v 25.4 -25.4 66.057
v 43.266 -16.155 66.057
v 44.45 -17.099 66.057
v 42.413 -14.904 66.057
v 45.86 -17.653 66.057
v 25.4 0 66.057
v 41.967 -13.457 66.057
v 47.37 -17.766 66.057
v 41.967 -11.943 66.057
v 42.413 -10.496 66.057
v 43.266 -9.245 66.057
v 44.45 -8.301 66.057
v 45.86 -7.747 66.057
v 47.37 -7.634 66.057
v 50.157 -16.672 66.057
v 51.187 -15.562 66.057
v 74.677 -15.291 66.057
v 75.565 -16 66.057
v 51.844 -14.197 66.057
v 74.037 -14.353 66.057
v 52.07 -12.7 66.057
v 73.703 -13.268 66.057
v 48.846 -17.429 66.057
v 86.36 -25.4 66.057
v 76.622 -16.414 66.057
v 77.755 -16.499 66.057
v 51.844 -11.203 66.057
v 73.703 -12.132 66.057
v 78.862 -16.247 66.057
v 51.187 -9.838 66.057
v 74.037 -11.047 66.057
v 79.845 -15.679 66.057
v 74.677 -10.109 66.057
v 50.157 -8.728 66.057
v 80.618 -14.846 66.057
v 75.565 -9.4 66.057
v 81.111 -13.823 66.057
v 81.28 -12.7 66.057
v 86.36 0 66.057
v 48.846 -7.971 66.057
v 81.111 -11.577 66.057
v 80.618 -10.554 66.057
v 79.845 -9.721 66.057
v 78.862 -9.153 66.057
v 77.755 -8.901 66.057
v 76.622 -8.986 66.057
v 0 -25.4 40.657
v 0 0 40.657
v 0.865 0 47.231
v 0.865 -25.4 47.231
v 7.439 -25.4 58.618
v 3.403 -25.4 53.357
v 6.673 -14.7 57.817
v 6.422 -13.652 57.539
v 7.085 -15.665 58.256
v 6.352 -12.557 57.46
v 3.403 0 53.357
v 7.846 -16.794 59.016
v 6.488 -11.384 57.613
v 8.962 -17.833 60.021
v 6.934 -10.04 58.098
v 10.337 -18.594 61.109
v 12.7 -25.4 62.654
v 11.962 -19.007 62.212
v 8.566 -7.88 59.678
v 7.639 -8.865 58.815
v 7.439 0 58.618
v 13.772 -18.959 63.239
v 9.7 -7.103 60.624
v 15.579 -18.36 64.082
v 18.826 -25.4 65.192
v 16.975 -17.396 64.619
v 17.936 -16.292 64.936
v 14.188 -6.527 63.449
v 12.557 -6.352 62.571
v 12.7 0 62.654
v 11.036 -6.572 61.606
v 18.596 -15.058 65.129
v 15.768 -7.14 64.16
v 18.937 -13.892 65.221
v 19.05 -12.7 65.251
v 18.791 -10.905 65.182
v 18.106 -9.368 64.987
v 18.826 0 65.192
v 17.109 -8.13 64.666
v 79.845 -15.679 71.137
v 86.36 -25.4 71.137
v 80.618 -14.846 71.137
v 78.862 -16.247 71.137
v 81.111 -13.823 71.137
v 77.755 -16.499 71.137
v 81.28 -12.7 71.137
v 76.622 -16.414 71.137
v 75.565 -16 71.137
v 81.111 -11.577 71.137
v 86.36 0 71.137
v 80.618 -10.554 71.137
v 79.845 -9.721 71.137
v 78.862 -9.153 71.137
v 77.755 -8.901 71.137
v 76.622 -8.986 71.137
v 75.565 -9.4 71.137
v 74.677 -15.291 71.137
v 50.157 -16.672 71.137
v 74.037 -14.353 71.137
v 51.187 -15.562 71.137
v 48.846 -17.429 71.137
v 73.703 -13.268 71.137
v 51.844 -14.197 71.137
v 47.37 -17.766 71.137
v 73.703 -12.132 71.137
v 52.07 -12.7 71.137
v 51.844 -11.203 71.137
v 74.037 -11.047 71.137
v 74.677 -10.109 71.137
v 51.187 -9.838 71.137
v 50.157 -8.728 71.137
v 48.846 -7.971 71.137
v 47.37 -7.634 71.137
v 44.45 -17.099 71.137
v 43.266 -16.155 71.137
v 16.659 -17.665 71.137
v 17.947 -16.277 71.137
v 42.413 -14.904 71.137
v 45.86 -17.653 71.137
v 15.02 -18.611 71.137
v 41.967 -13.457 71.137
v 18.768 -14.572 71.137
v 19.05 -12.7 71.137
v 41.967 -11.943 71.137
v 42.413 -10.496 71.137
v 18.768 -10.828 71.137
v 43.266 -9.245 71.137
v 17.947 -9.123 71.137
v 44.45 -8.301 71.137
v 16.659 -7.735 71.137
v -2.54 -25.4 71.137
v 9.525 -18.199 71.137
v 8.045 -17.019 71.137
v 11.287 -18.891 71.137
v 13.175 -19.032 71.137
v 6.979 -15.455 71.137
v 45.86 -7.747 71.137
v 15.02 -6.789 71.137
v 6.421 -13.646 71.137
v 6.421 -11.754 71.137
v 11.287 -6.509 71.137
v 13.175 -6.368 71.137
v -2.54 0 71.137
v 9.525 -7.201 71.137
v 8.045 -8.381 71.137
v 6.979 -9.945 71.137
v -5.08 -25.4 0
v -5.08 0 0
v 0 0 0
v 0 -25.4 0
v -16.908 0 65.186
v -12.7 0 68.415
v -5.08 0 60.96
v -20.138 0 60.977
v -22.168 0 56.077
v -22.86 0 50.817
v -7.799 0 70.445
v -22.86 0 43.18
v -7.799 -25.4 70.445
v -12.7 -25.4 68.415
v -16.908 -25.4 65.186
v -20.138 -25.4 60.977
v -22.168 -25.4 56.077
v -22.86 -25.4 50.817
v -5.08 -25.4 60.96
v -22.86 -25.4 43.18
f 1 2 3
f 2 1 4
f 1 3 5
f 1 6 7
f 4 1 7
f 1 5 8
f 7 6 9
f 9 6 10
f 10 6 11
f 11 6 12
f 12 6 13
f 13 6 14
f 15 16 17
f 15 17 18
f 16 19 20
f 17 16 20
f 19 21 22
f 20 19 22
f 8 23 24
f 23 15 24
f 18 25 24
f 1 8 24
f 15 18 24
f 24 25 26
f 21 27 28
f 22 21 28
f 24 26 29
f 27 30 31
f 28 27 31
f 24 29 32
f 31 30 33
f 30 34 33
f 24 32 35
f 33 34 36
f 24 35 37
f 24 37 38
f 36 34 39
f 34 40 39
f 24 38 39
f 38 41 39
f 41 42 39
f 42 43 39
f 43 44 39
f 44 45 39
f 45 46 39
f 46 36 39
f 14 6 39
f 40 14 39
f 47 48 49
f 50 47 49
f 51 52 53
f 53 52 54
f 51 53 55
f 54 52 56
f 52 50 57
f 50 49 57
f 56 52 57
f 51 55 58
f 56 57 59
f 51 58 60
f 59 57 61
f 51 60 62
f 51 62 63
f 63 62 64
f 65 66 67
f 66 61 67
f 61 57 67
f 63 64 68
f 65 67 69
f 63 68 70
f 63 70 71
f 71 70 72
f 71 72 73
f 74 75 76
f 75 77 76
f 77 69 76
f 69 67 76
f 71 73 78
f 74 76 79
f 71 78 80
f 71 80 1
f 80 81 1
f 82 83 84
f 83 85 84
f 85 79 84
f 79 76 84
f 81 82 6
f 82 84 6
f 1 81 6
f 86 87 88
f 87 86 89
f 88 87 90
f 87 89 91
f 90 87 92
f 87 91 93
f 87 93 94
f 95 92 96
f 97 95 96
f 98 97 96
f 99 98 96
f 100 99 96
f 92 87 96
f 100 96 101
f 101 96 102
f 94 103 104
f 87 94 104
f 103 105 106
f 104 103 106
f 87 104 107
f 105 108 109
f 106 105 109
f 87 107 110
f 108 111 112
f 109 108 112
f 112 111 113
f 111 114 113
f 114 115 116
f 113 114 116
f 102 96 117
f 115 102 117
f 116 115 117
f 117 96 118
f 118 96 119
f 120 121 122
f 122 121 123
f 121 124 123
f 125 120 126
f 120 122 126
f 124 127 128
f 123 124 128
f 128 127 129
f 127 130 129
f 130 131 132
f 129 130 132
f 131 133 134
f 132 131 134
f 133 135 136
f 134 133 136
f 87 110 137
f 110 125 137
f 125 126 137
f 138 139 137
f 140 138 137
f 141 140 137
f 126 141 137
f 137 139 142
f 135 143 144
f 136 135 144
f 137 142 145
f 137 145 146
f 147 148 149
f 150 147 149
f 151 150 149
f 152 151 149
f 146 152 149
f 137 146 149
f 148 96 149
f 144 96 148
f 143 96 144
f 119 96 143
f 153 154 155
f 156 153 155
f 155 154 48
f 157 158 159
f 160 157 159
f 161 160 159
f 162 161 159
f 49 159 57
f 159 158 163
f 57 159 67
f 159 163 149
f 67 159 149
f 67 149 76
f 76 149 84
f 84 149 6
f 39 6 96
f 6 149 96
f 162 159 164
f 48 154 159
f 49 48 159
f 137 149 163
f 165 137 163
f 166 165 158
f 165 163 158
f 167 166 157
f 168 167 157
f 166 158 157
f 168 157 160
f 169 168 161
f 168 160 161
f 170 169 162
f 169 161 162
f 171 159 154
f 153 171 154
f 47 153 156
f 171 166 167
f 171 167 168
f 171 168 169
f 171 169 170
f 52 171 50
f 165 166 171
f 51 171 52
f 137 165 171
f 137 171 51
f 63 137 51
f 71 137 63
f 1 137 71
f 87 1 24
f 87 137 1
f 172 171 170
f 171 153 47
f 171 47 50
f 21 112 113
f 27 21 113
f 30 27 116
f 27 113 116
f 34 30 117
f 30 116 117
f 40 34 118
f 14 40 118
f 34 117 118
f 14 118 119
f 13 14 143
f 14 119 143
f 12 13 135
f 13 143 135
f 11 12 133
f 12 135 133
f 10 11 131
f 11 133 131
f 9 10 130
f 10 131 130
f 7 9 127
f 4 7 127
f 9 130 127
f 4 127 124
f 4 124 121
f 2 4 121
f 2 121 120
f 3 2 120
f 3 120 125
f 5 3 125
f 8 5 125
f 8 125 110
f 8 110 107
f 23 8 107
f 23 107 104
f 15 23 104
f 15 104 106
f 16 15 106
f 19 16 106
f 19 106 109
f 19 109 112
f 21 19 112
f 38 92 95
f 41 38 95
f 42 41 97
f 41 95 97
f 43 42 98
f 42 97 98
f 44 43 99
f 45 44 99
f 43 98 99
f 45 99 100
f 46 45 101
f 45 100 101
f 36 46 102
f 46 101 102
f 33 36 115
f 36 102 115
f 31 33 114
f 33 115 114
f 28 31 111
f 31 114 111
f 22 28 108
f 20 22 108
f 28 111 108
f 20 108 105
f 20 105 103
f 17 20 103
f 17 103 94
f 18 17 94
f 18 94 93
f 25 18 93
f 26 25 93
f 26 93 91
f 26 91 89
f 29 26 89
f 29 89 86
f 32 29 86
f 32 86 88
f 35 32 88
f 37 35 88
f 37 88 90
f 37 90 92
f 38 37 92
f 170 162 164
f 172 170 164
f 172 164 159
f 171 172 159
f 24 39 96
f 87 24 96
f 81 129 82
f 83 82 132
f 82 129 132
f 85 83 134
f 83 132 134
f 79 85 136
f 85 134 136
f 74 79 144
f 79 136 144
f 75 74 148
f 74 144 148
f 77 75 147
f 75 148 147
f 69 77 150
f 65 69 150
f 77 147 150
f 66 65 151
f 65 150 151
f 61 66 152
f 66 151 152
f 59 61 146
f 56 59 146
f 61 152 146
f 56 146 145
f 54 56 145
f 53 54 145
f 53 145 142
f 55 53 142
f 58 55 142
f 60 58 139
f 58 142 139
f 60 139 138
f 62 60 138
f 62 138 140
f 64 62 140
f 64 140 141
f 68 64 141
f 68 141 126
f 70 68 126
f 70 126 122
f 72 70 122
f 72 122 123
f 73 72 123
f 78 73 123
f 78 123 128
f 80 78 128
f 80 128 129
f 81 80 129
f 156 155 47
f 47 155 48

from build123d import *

# Parameters (mm, degrees)
F1_DEPTH = 25.4
F2_R     = 3.81
F2_R_2   = 5.08
F2_R_3   = 6.35
F3_DEPTH = 71.1383146132


# Not quite as in the source:
# - a feature names something its author has since deleted; it is built from what else it names


with BuildPart() as f1:
    # F0 (on Front) → F1 (new body)
    with BuildSketch(Plane.XZ):
        with BuildLine():
            Line((-5.08, 0), (0, 0))
            Line((0, 0), (0, 38.1))
            Line((0, 38.1), (0, 40.6573146132))
            ThreePointArc((0, 40.6573146132), (7.4394877579, 58.6178268553), (25.4, 66.0573146132))
            Line((25.4, 66.0573146132), (86.36, 66.0573146132))
            Line((86.36, 66.0573146132), (86.36, 71.1373146132))
            Line((86.36, 71.1373146132), (0, 71.1373146132))
            Line((0, 71.1373146132), (-2.54, 71.1373146132))
            ThreePointArc((-2.54, 71.1373146132), (-16.9084097937, 65.1857244069), (-22.86, 50.8173146132))
            Line((-22.86, 50.8173146132), (-22.86, 43.18))
            Line((-22.86, 43.18), (-5.08, 60.96))
            Line((-5.08, 60.96), (-5.08, 0))
        make_face()
    extrude(amount=F1_DEPTH)

    # F2 (on face) → F3 (cut, through all)
    with BuildSketch(Plane.XY.offset(71.1373146132)):
        with Locations((77.47, -12.7)):
            Circle(F2_R)
        with Locations((46.99, -12.7)):
            Circle(F2_R_2)
        with Locations((12.7, -12.7)):
            Circle(F2_R_3)
    extrude(amount=-F3_DEPTH, mode=Mode.SUBTRACT)


solid = f1.part
